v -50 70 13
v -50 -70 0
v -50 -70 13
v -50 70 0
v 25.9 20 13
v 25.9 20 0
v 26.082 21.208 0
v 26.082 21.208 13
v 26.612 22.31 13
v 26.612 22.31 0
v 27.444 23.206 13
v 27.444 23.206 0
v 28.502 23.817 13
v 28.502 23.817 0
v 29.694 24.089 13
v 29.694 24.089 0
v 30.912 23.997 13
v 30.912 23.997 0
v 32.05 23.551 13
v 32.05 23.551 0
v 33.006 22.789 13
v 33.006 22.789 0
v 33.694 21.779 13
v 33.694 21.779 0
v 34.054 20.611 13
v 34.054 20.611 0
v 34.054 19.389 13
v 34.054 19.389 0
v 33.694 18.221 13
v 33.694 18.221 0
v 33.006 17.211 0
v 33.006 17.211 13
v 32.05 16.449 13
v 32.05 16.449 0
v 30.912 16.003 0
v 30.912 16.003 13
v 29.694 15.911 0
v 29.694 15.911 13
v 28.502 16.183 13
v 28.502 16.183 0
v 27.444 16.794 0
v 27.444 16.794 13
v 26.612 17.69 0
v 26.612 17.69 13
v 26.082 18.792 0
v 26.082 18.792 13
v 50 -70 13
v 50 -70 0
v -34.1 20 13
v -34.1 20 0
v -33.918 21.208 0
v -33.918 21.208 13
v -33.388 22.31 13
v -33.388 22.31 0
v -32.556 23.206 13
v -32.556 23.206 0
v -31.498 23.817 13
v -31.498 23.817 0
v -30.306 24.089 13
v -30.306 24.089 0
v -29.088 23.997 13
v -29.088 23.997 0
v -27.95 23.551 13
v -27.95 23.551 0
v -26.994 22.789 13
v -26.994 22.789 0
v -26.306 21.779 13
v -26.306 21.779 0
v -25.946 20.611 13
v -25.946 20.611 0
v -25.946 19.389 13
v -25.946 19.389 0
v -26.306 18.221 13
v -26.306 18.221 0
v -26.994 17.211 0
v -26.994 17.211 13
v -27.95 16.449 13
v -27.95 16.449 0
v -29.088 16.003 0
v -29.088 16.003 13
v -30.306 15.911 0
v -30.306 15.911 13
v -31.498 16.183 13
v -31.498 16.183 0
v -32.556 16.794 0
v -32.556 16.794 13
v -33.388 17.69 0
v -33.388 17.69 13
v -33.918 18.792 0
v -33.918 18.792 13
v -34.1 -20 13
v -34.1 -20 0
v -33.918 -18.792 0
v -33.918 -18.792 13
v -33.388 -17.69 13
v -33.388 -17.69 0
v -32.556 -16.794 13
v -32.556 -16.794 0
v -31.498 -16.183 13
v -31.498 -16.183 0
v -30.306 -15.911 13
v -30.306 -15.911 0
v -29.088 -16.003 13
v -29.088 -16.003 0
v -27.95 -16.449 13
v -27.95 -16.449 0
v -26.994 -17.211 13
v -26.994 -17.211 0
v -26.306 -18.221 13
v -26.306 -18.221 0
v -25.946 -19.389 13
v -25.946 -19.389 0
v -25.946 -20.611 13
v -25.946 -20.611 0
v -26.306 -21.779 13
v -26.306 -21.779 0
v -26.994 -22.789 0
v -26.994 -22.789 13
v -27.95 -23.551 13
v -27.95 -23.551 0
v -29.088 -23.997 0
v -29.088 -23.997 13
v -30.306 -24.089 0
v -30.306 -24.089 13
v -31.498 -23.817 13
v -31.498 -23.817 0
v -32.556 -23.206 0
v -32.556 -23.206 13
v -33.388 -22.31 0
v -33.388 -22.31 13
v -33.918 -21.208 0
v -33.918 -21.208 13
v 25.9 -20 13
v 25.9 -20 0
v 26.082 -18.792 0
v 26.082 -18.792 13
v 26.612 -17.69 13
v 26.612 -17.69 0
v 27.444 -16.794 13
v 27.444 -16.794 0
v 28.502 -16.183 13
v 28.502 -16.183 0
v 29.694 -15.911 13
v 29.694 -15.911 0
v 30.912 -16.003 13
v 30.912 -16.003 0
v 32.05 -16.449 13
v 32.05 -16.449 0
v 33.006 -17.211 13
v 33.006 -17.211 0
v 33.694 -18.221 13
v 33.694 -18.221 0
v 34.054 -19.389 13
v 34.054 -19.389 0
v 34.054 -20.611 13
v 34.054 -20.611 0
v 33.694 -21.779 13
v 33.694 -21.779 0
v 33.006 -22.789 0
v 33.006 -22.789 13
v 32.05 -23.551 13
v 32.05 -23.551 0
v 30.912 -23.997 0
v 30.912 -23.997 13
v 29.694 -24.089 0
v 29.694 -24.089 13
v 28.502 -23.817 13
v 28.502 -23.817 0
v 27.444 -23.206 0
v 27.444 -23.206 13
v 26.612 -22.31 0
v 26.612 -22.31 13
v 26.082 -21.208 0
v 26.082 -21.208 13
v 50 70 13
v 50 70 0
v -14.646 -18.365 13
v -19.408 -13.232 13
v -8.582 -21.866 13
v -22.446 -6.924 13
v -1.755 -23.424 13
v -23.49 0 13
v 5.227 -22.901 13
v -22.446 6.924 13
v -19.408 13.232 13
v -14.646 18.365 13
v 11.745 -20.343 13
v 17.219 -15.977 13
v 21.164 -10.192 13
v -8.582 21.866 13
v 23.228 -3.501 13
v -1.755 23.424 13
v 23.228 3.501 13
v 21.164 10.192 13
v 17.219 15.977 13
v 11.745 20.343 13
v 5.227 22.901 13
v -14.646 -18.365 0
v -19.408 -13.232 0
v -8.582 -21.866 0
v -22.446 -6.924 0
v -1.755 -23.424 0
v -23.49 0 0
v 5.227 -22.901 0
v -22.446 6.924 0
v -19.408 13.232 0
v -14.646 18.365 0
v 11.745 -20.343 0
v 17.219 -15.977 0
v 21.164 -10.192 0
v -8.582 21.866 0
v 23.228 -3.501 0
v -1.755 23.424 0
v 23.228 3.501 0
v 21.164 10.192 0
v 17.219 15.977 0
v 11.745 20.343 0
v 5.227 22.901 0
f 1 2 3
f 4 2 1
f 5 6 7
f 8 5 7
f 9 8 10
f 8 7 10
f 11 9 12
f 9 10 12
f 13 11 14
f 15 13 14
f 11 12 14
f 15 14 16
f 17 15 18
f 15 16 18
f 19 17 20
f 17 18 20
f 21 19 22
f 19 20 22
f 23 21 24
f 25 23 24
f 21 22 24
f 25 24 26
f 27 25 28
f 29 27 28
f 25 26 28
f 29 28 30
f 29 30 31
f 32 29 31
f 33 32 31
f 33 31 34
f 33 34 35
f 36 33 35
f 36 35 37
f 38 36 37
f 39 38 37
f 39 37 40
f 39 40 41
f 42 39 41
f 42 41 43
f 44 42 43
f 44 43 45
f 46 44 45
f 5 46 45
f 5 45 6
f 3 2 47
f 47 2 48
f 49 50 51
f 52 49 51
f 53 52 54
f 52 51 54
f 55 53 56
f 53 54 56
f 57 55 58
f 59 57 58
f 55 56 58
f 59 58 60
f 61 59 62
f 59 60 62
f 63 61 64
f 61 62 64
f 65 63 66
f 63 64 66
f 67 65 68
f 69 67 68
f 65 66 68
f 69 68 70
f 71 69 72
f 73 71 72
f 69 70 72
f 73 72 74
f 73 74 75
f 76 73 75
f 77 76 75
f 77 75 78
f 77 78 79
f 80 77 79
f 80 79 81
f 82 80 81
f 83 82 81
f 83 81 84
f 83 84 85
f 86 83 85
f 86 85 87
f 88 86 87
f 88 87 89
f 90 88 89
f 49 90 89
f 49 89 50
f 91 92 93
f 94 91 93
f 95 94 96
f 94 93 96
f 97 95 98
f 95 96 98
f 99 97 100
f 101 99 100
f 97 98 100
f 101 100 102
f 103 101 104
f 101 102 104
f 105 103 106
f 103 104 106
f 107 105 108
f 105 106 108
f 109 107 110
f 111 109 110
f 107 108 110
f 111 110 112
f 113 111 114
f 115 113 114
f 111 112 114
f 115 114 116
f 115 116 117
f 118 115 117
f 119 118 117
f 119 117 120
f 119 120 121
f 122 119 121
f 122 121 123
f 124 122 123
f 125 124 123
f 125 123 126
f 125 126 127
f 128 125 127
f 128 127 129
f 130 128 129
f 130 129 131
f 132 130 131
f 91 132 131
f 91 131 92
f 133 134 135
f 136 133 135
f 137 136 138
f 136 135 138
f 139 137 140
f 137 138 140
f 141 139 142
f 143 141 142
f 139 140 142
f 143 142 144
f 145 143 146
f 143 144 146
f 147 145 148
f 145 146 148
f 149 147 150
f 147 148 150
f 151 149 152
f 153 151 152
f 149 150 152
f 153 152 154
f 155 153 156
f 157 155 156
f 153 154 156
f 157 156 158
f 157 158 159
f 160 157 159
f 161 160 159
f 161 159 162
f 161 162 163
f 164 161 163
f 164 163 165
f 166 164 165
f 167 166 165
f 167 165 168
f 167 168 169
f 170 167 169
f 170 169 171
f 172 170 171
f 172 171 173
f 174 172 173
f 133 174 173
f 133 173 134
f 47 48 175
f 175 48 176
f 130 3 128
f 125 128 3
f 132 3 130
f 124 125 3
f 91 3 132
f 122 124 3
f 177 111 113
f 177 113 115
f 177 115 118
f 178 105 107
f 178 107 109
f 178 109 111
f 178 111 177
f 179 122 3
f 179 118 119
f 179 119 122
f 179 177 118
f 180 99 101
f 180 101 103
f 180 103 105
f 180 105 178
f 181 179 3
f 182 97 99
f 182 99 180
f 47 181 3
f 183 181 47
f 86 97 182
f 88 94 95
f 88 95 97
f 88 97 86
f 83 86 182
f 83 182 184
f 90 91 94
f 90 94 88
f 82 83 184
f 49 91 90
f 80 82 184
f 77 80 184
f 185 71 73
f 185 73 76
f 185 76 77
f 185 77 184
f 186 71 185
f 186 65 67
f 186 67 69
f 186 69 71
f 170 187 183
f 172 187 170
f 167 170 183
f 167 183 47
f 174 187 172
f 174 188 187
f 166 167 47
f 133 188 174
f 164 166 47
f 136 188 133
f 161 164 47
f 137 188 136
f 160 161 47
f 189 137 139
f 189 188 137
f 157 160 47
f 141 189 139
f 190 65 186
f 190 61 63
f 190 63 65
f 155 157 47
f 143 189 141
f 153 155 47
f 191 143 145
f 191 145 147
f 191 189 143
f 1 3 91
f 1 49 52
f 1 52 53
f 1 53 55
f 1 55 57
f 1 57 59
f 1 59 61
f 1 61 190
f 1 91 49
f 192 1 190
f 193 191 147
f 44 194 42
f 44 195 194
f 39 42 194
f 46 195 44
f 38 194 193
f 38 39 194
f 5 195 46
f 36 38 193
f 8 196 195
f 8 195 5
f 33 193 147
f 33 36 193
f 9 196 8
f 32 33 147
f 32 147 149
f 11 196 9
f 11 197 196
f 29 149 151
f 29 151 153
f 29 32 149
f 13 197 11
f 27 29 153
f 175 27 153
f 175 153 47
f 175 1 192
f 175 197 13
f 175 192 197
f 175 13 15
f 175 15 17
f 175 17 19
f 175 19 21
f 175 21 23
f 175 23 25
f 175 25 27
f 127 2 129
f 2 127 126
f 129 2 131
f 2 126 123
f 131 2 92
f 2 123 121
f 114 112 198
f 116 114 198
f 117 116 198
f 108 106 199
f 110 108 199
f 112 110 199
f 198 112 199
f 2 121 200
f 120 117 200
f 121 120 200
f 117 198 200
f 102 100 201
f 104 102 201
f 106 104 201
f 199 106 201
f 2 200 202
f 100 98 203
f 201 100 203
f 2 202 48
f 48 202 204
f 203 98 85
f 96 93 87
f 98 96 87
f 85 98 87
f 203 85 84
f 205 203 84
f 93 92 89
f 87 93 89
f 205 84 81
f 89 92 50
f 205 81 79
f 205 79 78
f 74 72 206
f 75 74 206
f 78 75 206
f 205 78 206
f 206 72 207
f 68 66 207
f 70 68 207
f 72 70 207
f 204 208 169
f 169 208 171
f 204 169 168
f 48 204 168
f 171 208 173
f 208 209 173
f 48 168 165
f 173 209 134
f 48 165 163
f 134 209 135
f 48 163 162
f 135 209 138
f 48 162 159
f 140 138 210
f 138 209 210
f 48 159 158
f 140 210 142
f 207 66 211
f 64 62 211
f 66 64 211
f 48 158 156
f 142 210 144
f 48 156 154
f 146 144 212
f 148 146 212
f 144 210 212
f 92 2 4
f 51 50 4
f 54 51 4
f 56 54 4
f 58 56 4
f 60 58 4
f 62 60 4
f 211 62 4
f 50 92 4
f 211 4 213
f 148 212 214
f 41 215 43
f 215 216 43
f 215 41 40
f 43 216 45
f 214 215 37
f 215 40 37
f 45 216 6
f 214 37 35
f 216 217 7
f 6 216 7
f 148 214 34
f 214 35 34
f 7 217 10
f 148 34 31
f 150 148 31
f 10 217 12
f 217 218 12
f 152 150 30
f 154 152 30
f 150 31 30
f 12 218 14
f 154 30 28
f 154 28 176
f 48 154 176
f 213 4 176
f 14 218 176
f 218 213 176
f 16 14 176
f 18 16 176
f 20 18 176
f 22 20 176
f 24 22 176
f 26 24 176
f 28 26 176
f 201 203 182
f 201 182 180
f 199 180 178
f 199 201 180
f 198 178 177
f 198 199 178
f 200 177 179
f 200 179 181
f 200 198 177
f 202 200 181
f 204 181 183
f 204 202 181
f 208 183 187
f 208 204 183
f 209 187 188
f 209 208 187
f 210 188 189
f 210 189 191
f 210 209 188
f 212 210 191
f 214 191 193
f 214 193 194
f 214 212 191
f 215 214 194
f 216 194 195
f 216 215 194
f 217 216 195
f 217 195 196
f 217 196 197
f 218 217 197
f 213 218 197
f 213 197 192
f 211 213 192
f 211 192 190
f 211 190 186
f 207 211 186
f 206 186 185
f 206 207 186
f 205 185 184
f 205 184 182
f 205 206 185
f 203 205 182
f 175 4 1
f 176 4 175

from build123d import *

# Parameters (mm, degrees)
SKETCH1_W                = 100
SKETCH1_H                = 140
SKETCH1_R                = 23.49
BOSS_EXTRUDE1_DEPTH      = 13
M8_CLEARANCE_HOLE1_D     = 8.2
M8_CLEARANCE_HOLE1_DEPTH = 19.75
M8_CLEARANCE_HOLE1_TIP   = 2.463528538


with BuildPart() as part:
    # Sketch1 → Boss-Extrude1 (new body)
    with BuildSketch(Plane.XY):
        Rectangle(SKETCH1_W, SKETCH1_H)
        with Locations(Location((0, 0, 0), (0, 0, 180))):
            Circle(SKETCH1_R, mode=Mode.SUBTRACT)
    extrude(amount=BOSS_EXTRUDE1_DEPTH)

    # M8 Clearance Hole1
    with Locations(Plane(origin=(-30, 20, 13), x_dir=(1, 0, 0), z_dir=(0, 0, 1))):
        with Locations((0, 0), (60, 0), (60, -40), (0, -40)):
            Hole(M8_CLEARANCE_HOLE1_D / 2, depth=M8_CLEARANCE_HOLE1_DEPTH)
            with Locations((0, 0, -(M8_CLEARANCE_HOLE1_DEPTH + M8_CLEARANCE_HOLE1_TIP / 2))):  # 118° drill point
                Cone(0, M8_CLEARANCE_HOLE1_D / 2, M8_CLEARANCE_HOLE1_TIP, mode=Mode.SUBTRACT)


solid = part.part
